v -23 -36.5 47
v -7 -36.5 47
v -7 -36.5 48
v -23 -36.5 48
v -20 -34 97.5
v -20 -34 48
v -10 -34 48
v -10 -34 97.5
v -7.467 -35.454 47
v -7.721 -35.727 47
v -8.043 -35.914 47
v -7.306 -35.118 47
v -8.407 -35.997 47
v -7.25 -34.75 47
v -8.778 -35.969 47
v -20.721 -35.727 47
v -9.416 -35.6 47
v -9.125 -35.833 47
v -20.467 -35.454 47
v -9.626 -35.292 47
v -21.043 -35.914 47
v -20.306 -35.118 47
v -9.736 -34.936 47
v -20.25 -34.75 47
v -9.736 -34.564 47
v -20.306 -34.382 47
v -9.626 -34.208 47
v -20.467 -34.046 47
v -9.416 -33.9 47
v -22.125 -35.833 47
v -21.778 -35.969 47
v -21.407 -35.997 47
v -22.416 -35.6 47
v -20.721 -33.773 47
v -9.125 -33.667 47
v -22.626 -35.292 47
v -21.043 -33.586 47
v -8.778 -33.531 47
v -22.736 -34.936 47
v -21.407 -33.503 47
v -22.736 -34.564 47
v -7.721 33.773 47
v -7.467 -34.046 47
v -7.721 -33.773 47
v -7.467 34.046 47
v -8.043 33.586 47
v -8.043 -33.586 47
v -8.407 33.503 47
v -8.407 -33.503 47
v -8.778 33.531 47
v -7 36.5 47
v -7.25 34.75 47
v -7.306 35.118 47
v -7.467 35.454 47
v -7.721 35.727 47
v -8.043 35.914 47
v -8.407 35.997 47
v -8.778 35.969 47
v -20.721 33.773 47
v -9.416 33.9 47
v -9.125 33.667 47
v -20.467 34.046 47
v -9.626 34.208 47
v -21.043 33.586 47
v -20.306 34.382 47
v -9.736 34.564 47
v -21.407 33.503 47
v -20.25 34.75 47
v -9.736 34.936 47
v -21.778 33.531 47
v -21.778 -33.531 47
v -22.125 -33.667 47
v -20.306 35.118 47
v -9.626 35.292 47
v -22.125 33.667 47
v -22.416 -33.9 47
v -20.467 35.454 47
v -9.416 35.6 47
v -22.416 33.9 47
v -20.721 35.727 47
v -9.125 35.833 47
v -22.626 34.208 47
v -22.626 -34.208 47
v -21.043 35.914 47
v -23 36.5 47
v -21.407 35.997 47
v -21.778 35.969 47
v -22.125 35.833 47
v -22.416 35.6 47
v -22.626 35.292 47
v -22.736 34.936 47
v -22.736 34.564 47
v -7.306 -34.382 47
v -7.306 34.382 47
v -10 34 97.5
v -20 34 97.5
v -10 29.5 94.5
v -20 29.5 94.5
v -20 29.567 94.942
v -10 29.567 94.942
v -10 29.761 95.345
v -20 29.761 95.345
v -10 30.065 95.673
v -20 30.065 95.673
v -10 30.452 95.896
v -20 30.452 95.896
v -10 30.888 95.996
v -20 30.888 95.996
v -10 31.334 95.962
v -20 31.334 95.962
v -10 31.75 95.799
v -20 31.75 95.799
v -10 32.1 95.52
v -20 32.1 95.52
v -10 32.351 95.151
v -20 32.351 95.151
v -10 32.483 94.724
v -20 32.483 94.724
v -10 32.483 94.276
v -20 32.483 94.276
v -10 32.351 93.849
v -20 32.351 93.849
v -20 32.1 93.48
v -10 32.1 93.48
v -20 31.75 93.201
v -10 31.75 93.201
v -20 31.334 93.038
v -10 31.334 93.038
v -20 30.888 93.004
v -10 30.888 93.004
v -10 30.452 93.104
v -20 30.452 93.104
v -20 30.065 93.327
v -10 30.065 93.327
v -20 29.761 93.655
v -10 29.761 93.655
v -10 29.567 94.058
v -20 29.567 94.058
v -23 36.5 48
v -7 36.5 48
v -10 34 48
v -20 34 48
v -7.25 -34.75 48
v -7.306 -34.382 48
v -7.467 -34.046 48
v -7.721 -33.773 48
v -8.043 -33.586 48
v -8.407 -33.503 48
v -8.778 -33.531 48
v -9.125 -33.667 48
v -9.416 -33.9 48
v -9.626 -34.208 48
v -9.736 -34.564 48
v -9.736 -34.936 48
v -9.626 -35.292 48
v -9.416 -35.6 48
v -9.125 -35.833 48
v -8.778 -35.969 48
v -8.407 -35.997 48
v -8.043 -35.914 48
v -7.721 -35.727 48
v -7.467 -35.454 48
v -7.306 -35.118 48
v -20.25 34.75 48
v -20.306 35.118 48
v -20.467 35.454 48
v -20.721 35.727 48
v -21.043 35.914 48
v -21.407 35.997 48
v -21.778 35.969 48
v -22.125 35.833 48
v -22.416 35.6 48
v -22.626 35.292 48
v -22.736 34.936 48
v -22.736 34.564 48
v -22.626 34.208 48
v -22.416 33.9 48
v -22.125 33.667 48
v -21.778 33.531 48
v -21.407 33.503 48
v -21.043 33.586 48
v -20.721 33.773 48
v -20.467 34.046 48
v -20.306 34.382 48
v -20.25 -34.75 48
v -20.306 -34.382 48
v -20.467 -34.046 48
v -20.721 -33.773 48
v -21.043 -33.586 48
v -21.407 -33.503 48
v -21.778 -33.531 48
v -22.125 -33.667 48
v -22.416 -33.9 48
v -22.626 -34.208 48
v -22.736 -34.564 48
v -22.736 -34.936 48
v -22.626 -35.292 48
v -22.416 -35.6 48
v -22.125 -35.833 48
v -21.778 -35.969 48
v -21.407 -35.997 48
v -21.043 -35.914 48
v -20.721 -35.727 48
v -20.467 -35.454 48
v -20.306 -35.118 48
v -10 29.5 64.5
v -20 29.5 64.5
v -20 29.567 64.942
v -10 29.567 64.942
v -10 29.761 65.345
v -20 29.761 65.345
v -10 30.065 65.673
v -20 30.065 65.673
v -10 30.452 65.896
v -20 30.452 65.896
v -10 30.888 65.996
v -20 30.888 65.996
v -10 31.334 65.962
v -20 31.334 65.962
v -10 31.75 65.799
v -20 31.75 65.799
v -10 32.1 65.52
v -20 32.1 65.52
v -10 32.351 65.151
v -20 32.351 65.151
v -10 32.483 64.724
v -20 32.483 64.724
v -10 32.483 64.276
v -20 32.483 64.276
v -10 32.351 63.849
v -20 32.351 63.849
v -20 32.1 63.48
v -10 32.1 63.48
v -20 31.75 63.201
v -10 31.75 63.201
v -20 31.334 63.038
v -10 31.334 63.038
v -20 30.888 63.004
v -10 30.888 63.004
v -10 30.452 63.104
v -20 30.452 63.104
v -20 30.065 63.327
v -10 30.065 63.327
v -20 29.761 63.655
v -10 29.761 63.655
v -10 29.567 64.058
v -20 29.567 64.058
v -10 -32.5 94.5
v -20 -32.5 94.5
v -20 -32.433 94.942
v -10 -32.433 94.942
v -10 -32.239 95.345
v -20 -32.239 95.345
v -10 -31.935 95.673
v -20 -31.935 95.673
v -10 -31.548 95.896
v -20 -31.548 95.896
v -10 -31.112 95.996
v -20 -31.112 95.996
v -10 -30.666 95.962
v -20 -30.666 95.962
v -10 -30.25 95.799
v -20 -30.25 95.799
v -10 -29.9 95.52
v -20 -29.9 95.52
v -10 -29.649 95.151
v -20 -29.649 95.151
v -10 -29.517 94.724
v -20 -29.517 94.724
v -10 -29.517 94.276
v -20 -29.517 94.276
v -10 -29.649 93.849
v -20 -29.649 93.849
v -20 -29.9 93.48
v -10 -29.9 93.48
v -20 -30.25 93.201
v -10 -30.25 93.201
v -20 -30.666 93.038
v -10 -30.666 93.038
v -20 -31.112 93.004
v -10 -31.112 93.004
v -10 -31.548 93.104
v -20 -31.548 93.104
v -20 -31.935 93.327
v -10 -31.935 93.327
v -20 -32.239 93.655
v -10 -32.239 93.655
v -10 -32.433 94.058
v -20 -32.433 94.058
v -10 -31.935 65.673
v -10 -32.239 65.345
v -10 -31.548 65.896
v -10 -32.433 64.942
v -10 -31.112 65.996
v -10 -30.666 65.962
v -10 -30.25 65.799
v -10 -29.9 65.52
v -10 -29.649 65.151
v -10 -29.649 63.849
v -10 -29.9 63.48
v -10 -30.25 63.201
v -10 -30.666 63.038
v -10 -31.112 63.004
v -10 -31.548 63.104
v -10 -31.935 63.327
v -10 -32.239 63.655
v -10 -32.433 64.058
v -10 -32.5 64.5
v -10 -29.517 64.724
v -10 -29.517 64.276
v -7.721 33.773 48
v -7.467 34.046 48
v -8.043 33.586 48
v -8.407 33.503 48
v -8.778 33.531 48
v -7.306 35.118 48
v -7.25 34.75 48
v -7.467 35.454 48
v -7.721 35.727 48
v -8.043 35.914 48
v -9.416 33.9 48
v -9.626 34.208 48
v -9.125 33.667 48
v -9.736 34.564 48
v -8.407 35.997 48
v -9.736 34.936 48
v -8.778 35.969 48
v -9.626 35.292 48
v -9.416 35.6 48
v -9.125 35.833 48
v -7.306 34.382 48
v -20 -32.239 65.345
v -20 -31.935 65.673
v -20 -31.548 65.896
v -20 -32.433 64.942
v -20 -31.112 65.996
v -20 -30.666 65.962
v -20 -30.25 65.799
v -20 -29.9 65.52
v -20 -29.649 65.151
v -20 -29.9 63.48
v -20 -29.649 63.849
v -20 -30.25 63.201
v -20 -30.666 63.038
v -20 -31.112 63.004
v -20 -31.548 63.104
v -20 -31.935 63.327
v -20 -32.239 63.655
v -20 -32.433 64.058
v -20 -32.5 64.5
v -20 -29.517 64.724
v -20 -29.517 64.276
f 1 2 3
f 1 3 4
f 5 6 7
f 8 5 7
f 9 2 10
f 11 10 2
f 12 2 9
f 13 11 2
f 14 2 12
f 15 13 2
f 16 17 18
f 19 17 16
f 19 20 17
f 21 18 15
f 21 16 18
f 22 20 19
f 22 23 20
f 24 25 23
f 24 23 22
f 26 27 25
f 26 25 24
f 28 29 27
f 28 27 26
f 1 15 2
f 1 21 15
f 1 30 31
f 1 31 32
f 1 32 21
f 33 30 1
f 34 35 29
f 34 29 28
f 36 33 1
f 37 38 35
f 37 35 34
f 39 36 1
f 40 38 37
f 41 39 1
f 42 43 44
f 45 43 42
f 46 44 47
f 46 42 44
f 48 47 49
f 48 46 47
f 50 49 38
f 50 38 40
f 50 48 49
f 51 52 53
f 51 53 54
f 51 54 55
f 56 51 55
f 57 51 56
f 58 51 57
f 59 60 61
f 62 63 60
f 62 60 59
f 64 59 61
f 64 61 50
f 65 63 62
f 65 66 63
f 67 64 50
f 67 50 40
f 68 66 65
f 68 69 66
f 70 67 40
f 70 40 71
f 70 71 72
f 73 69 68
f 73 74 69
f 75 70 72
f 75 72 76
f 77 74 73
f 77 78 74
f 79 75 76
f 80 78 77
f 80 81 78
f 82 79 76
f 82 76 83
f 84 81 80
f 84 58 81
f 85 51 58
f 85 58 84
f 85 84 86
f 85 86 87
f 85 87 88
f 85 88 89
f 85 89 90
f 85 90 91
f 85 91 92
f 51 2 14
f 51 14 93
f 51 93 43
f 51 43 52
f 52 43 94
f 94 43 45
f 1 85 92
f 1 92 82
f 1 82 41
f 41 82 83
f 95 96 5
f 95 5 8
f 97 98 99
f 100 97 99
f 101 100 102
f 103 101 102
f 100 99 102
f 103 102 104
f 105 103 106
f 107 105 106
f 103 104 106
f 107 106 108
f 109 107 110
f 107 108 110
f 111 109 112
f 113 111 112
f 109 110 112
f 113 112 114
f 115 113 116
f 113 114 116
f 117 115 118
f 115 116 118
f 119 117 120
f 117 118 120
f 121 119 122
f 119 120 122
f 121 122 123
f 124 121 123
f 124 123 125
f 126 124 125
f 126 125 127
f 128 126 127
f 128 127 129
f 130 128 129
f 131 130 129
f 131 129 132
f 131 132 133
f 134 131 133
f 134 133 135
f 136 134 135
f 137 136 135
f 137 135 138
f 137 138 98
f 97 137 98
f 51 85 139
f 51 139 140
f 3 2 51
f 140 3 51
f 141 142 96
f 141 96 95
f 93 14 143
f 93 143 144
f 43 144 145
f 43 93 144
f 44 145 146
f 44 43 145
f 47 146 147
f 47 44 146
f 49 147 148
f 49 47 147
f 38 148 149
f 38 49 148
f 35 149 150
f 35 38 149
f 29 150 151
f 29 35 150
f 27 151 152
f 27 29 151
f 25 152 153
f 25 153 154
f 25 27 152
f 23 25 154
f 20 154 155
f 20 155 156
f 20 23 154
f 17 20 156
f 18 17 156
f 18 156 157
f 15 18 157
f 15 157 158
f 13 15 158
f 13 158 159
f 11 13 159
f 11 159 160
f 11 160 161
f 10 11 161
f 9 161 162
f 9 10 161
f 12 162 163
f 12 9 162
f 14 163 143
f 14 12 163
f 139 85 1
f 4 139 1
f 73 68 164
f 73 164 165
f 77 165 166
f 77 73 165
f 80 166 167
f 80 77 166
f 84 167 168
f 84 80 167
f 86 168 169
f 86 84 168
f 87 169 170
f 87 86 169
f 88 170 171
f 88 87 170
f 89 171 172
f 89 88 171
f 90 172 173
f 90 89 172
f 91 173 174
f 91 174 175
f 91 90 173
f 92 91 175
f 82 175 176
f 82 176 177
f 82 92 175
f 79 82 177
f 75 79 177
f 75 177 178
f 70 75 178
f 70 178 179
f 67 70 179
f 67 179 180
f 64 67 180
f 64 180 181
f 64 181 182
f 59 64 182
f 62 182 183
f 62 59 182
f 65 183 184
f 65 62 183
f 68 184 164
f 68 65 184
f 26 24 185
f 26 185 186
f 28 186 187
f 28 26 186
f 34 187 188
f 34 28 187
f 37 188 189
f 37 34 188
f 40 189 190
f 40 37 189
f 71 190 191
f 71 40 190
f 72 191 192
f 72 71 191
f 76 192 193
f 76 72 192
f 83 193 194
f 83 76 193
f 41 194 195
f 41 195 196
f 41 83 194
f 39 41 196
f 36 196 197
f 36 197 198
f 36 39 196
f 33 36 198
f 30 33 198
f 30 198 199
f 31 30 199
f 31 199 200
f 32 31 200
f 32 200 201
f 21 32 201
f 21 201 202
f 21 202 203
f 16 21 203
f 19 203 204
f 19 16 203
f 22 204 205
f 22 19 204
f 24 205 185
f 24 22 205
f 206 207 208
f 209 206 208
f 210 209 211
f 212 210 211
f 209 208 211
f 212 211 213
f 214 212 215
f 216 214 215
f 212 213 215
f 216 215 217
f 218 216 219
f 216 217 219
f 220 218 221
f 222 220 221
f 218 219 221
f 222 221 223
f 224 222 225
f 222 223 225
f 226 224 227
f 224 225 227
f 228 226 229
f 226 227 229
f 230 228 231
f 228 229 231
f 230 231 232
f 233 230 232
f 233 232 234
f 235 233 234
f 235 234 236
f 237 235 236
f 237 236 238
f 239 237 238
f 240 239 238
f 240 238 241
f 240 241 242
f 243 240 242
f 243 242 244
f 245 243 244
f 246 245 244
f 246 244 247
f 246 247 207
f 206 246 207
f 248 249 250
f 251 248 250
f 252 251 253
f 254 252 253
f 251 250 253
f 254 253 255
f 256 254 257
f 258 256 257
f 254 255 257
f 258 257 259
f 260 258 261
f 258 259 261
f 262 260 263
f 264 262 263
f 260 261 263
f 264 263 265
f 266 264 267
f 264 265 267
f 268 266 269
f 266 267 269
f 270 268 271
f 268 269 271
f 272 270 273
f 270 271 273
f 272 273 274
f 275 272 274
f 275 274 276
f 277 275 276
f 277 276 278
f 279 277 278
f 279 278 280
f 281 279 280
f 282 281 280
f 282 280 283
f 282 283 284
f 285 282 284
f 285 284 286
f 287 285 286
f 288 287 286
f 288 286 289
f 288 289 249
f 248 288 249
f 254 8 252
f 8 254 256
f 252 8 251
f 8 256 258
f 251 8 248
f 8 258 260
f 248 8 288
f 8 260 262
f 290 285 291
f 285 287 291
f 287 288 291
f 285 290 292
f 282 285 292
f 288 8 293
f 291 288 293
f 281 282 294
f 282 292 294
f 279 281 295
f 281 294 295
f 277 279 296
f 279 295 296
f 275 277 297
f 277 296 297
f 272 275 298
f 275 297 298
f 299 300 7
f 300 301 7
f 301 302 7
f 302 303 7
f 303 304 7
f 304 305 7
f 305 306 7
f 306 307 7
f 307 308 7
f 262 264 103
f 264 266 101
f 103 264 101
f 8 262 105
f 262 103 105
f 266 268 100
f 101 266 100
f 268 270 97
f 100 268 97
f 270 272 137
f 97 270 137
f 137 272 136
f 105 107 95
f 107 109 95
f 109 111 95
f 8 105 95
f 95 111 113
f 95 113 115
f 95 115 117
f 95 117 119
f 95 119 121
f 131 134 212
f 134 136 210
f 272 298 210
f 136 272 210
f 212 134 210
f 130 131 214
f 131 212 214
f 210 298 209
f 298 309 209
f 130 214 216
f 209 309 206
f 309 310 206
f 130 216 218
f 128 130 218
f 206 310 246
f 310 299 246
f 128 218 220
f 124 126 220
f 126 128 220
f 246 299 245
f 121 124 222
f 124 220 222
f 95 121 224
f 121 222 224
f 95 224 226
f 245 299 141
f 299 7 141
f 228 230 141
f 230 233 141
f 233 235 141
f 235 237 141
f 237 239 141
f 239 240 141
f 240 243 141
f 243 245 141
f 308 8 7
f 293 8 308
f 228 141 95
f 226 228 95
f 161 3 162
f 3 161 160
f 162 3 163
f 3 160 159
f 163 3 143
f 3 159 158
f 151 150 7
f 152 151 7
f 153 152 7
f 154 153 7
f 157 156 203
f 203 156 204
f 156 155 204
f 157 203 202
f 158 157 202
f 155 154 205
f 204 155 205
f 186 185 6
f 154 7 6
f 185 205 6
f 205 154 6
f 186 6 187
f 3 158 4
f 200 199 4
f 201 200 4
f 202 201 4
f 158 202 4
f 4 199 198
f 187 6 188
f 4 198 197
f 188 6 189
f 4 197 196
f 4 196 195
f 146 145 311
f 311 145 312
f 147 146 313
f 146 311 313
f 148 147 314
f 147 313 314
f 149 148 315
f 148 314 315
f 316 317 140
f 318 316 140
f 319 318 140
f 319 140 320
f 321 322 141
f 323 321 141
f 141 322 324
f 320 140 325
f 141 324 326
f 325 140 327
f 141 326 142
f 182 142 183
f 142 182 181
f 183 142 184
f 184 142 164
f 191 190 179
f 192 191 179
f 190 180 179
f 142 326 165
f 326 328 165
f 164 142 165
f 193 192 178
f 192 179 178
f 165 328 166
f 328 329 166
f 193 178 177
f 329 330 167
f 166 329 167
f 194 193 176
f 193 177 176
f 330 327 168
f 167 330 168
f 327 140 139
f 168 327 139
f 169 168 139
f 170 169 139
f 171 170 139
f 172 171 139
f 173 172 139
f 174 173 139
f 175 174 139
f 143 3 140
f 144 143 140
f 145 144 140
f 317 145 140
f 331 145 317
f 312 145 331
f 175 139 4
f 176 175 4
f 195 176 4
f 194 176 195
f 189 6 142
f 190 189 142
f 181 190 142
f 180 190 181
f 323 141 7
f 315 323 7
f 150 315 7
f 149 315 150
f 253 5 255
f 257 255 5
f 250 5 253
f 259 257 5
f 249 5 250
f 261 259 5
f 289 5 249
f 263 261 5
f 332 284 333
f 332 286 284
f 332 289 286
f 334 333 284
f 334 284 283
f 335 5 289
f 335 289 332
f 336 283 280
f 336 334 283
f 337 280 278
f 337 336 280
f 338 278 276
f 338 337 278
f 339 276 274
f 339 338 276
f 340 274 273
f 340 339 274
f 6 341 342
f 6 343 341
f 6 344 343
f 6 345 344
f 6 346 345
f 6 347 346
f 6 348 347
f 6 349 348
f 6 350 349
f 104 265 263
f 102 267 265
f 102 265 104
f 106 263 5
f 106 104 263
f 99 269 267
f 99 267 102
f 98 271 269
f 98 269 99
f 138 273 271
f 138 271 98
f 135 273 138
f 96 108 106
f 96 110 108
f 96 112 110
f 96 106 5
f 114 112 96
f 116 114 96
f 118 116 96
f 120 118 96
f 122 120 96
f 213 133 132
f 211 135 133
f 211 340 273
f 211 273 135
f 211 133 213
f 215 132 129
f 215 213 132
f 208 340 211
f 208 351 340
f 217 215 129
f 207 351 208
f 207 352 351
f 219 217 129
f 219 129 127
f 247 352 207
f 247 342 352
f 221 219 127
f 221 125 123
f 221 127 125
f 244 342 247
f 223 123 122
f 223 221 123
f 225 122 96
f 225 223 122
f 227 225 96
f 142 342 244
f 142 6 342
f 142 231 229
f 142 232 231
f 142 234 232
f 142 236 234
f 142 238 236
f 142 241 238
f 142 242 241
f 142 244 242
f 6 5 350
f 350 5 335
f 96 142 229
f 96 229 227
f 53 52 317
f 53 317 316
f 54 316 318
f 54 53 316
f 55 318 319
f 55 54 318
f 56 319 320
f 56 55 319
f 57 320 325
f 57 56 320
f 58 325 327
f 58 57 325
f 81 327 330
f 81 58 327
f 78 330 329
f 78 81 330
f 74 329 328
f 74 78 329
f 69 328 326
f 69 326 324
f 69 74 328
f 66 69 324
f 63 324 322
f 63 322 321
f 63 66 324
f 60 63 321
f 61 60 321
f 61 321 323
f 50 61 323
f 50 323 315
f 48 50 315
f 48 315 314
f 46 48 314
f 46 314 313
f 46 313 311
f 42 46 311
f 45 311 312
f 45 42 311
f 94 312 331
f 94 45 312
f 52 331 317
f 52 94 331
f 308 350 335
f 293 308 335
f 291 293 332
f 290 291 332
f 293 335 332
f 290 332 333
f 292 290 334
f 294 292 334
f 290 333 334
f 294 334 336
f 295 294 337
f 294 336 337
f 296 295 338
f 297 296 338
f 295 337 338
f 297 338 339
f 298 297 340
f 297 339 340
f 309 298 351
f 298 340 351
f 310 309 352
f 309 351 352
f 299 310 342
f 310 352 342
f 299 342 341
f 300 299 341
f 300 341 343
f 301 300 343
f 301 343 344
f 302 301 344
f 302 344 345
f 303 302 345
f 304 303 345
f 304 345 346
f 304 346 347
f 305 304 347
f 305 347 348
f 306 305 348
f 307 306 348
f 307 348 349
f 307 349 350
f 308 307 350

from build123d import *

# Parameters (mm, degrees)
SKETCH080_R     = 1.25
PAD056_DEPTH    = 1
SKETCH081_W     = 10
SKETCH081_H     = 68
PAD057_DEPTH    = 49.5
SKETCH082_R     = 1.5
POCKET015_DEPTH = 13.001


with BuildPart() as part:
    # Sketch080 → Pad056 (new body)
    with BuildSketch(Plane.XY):
        Polygon((-8, 36.5), (8, 36.5), (8, 33), (8, -33), (8, -36.5), (-8, -36.5), (-8, -33), (-8, 33), align=None)
        with Locations((-6.5, 34.75)):
            Circle(SKETCH080_R, mode=Mode.SUBTRACT)
        with Locations((6.5, 34.75)):
            Circle(SKETCH080_R, mode=Mode.SUBTRACT)
        with Locations((-6.5, -34.75)):
            Circle(SKETCH080_R, mode=Mode.SUBTRACT)
        with Locations((6.5, -34.75)):
            Circle(SKETCH080_R, mode=Mode.SUBTRACT)
    extrude(amount=PAD056_DEPTH)

    # Sketch081 (on Face14 of Pad056) → Pad057 (join)
    with BuildSketch(Plane.XY.offset(1)):
        Rectangle(SKETCH081_W, SKETCH081_H)
    extrude(amount=PAD057_DEPTH)

    # Sketch082 (on Face15 of Pad057) → Pocket015 (cut, through all)
    with BuildSketch(Plane(origin=(-5, 0, 0), x_dir=(0, -1, 0), z_dir=(-1, 0, 0))):
        with Locations((31, 47.5)):
            Circle(SKETCH082_R)
        with Locations((-31, 47.5)):
            Circle(SKETCH082_R)
        with Locations((-31, 17.5)):
            Circle(SKETCH082_R)
        with Locations((31, 17.5)):
            Circle(SKETCH082_R)
    extrude(amount=-POCKET015_DEPTH, mode=Mode.SUBTRACT)


with BuildPart() as part_1:
    # Body025 placement: moved
    add(part.part.moved(Location((-15, 0, 47))))


solid = part_1.part
